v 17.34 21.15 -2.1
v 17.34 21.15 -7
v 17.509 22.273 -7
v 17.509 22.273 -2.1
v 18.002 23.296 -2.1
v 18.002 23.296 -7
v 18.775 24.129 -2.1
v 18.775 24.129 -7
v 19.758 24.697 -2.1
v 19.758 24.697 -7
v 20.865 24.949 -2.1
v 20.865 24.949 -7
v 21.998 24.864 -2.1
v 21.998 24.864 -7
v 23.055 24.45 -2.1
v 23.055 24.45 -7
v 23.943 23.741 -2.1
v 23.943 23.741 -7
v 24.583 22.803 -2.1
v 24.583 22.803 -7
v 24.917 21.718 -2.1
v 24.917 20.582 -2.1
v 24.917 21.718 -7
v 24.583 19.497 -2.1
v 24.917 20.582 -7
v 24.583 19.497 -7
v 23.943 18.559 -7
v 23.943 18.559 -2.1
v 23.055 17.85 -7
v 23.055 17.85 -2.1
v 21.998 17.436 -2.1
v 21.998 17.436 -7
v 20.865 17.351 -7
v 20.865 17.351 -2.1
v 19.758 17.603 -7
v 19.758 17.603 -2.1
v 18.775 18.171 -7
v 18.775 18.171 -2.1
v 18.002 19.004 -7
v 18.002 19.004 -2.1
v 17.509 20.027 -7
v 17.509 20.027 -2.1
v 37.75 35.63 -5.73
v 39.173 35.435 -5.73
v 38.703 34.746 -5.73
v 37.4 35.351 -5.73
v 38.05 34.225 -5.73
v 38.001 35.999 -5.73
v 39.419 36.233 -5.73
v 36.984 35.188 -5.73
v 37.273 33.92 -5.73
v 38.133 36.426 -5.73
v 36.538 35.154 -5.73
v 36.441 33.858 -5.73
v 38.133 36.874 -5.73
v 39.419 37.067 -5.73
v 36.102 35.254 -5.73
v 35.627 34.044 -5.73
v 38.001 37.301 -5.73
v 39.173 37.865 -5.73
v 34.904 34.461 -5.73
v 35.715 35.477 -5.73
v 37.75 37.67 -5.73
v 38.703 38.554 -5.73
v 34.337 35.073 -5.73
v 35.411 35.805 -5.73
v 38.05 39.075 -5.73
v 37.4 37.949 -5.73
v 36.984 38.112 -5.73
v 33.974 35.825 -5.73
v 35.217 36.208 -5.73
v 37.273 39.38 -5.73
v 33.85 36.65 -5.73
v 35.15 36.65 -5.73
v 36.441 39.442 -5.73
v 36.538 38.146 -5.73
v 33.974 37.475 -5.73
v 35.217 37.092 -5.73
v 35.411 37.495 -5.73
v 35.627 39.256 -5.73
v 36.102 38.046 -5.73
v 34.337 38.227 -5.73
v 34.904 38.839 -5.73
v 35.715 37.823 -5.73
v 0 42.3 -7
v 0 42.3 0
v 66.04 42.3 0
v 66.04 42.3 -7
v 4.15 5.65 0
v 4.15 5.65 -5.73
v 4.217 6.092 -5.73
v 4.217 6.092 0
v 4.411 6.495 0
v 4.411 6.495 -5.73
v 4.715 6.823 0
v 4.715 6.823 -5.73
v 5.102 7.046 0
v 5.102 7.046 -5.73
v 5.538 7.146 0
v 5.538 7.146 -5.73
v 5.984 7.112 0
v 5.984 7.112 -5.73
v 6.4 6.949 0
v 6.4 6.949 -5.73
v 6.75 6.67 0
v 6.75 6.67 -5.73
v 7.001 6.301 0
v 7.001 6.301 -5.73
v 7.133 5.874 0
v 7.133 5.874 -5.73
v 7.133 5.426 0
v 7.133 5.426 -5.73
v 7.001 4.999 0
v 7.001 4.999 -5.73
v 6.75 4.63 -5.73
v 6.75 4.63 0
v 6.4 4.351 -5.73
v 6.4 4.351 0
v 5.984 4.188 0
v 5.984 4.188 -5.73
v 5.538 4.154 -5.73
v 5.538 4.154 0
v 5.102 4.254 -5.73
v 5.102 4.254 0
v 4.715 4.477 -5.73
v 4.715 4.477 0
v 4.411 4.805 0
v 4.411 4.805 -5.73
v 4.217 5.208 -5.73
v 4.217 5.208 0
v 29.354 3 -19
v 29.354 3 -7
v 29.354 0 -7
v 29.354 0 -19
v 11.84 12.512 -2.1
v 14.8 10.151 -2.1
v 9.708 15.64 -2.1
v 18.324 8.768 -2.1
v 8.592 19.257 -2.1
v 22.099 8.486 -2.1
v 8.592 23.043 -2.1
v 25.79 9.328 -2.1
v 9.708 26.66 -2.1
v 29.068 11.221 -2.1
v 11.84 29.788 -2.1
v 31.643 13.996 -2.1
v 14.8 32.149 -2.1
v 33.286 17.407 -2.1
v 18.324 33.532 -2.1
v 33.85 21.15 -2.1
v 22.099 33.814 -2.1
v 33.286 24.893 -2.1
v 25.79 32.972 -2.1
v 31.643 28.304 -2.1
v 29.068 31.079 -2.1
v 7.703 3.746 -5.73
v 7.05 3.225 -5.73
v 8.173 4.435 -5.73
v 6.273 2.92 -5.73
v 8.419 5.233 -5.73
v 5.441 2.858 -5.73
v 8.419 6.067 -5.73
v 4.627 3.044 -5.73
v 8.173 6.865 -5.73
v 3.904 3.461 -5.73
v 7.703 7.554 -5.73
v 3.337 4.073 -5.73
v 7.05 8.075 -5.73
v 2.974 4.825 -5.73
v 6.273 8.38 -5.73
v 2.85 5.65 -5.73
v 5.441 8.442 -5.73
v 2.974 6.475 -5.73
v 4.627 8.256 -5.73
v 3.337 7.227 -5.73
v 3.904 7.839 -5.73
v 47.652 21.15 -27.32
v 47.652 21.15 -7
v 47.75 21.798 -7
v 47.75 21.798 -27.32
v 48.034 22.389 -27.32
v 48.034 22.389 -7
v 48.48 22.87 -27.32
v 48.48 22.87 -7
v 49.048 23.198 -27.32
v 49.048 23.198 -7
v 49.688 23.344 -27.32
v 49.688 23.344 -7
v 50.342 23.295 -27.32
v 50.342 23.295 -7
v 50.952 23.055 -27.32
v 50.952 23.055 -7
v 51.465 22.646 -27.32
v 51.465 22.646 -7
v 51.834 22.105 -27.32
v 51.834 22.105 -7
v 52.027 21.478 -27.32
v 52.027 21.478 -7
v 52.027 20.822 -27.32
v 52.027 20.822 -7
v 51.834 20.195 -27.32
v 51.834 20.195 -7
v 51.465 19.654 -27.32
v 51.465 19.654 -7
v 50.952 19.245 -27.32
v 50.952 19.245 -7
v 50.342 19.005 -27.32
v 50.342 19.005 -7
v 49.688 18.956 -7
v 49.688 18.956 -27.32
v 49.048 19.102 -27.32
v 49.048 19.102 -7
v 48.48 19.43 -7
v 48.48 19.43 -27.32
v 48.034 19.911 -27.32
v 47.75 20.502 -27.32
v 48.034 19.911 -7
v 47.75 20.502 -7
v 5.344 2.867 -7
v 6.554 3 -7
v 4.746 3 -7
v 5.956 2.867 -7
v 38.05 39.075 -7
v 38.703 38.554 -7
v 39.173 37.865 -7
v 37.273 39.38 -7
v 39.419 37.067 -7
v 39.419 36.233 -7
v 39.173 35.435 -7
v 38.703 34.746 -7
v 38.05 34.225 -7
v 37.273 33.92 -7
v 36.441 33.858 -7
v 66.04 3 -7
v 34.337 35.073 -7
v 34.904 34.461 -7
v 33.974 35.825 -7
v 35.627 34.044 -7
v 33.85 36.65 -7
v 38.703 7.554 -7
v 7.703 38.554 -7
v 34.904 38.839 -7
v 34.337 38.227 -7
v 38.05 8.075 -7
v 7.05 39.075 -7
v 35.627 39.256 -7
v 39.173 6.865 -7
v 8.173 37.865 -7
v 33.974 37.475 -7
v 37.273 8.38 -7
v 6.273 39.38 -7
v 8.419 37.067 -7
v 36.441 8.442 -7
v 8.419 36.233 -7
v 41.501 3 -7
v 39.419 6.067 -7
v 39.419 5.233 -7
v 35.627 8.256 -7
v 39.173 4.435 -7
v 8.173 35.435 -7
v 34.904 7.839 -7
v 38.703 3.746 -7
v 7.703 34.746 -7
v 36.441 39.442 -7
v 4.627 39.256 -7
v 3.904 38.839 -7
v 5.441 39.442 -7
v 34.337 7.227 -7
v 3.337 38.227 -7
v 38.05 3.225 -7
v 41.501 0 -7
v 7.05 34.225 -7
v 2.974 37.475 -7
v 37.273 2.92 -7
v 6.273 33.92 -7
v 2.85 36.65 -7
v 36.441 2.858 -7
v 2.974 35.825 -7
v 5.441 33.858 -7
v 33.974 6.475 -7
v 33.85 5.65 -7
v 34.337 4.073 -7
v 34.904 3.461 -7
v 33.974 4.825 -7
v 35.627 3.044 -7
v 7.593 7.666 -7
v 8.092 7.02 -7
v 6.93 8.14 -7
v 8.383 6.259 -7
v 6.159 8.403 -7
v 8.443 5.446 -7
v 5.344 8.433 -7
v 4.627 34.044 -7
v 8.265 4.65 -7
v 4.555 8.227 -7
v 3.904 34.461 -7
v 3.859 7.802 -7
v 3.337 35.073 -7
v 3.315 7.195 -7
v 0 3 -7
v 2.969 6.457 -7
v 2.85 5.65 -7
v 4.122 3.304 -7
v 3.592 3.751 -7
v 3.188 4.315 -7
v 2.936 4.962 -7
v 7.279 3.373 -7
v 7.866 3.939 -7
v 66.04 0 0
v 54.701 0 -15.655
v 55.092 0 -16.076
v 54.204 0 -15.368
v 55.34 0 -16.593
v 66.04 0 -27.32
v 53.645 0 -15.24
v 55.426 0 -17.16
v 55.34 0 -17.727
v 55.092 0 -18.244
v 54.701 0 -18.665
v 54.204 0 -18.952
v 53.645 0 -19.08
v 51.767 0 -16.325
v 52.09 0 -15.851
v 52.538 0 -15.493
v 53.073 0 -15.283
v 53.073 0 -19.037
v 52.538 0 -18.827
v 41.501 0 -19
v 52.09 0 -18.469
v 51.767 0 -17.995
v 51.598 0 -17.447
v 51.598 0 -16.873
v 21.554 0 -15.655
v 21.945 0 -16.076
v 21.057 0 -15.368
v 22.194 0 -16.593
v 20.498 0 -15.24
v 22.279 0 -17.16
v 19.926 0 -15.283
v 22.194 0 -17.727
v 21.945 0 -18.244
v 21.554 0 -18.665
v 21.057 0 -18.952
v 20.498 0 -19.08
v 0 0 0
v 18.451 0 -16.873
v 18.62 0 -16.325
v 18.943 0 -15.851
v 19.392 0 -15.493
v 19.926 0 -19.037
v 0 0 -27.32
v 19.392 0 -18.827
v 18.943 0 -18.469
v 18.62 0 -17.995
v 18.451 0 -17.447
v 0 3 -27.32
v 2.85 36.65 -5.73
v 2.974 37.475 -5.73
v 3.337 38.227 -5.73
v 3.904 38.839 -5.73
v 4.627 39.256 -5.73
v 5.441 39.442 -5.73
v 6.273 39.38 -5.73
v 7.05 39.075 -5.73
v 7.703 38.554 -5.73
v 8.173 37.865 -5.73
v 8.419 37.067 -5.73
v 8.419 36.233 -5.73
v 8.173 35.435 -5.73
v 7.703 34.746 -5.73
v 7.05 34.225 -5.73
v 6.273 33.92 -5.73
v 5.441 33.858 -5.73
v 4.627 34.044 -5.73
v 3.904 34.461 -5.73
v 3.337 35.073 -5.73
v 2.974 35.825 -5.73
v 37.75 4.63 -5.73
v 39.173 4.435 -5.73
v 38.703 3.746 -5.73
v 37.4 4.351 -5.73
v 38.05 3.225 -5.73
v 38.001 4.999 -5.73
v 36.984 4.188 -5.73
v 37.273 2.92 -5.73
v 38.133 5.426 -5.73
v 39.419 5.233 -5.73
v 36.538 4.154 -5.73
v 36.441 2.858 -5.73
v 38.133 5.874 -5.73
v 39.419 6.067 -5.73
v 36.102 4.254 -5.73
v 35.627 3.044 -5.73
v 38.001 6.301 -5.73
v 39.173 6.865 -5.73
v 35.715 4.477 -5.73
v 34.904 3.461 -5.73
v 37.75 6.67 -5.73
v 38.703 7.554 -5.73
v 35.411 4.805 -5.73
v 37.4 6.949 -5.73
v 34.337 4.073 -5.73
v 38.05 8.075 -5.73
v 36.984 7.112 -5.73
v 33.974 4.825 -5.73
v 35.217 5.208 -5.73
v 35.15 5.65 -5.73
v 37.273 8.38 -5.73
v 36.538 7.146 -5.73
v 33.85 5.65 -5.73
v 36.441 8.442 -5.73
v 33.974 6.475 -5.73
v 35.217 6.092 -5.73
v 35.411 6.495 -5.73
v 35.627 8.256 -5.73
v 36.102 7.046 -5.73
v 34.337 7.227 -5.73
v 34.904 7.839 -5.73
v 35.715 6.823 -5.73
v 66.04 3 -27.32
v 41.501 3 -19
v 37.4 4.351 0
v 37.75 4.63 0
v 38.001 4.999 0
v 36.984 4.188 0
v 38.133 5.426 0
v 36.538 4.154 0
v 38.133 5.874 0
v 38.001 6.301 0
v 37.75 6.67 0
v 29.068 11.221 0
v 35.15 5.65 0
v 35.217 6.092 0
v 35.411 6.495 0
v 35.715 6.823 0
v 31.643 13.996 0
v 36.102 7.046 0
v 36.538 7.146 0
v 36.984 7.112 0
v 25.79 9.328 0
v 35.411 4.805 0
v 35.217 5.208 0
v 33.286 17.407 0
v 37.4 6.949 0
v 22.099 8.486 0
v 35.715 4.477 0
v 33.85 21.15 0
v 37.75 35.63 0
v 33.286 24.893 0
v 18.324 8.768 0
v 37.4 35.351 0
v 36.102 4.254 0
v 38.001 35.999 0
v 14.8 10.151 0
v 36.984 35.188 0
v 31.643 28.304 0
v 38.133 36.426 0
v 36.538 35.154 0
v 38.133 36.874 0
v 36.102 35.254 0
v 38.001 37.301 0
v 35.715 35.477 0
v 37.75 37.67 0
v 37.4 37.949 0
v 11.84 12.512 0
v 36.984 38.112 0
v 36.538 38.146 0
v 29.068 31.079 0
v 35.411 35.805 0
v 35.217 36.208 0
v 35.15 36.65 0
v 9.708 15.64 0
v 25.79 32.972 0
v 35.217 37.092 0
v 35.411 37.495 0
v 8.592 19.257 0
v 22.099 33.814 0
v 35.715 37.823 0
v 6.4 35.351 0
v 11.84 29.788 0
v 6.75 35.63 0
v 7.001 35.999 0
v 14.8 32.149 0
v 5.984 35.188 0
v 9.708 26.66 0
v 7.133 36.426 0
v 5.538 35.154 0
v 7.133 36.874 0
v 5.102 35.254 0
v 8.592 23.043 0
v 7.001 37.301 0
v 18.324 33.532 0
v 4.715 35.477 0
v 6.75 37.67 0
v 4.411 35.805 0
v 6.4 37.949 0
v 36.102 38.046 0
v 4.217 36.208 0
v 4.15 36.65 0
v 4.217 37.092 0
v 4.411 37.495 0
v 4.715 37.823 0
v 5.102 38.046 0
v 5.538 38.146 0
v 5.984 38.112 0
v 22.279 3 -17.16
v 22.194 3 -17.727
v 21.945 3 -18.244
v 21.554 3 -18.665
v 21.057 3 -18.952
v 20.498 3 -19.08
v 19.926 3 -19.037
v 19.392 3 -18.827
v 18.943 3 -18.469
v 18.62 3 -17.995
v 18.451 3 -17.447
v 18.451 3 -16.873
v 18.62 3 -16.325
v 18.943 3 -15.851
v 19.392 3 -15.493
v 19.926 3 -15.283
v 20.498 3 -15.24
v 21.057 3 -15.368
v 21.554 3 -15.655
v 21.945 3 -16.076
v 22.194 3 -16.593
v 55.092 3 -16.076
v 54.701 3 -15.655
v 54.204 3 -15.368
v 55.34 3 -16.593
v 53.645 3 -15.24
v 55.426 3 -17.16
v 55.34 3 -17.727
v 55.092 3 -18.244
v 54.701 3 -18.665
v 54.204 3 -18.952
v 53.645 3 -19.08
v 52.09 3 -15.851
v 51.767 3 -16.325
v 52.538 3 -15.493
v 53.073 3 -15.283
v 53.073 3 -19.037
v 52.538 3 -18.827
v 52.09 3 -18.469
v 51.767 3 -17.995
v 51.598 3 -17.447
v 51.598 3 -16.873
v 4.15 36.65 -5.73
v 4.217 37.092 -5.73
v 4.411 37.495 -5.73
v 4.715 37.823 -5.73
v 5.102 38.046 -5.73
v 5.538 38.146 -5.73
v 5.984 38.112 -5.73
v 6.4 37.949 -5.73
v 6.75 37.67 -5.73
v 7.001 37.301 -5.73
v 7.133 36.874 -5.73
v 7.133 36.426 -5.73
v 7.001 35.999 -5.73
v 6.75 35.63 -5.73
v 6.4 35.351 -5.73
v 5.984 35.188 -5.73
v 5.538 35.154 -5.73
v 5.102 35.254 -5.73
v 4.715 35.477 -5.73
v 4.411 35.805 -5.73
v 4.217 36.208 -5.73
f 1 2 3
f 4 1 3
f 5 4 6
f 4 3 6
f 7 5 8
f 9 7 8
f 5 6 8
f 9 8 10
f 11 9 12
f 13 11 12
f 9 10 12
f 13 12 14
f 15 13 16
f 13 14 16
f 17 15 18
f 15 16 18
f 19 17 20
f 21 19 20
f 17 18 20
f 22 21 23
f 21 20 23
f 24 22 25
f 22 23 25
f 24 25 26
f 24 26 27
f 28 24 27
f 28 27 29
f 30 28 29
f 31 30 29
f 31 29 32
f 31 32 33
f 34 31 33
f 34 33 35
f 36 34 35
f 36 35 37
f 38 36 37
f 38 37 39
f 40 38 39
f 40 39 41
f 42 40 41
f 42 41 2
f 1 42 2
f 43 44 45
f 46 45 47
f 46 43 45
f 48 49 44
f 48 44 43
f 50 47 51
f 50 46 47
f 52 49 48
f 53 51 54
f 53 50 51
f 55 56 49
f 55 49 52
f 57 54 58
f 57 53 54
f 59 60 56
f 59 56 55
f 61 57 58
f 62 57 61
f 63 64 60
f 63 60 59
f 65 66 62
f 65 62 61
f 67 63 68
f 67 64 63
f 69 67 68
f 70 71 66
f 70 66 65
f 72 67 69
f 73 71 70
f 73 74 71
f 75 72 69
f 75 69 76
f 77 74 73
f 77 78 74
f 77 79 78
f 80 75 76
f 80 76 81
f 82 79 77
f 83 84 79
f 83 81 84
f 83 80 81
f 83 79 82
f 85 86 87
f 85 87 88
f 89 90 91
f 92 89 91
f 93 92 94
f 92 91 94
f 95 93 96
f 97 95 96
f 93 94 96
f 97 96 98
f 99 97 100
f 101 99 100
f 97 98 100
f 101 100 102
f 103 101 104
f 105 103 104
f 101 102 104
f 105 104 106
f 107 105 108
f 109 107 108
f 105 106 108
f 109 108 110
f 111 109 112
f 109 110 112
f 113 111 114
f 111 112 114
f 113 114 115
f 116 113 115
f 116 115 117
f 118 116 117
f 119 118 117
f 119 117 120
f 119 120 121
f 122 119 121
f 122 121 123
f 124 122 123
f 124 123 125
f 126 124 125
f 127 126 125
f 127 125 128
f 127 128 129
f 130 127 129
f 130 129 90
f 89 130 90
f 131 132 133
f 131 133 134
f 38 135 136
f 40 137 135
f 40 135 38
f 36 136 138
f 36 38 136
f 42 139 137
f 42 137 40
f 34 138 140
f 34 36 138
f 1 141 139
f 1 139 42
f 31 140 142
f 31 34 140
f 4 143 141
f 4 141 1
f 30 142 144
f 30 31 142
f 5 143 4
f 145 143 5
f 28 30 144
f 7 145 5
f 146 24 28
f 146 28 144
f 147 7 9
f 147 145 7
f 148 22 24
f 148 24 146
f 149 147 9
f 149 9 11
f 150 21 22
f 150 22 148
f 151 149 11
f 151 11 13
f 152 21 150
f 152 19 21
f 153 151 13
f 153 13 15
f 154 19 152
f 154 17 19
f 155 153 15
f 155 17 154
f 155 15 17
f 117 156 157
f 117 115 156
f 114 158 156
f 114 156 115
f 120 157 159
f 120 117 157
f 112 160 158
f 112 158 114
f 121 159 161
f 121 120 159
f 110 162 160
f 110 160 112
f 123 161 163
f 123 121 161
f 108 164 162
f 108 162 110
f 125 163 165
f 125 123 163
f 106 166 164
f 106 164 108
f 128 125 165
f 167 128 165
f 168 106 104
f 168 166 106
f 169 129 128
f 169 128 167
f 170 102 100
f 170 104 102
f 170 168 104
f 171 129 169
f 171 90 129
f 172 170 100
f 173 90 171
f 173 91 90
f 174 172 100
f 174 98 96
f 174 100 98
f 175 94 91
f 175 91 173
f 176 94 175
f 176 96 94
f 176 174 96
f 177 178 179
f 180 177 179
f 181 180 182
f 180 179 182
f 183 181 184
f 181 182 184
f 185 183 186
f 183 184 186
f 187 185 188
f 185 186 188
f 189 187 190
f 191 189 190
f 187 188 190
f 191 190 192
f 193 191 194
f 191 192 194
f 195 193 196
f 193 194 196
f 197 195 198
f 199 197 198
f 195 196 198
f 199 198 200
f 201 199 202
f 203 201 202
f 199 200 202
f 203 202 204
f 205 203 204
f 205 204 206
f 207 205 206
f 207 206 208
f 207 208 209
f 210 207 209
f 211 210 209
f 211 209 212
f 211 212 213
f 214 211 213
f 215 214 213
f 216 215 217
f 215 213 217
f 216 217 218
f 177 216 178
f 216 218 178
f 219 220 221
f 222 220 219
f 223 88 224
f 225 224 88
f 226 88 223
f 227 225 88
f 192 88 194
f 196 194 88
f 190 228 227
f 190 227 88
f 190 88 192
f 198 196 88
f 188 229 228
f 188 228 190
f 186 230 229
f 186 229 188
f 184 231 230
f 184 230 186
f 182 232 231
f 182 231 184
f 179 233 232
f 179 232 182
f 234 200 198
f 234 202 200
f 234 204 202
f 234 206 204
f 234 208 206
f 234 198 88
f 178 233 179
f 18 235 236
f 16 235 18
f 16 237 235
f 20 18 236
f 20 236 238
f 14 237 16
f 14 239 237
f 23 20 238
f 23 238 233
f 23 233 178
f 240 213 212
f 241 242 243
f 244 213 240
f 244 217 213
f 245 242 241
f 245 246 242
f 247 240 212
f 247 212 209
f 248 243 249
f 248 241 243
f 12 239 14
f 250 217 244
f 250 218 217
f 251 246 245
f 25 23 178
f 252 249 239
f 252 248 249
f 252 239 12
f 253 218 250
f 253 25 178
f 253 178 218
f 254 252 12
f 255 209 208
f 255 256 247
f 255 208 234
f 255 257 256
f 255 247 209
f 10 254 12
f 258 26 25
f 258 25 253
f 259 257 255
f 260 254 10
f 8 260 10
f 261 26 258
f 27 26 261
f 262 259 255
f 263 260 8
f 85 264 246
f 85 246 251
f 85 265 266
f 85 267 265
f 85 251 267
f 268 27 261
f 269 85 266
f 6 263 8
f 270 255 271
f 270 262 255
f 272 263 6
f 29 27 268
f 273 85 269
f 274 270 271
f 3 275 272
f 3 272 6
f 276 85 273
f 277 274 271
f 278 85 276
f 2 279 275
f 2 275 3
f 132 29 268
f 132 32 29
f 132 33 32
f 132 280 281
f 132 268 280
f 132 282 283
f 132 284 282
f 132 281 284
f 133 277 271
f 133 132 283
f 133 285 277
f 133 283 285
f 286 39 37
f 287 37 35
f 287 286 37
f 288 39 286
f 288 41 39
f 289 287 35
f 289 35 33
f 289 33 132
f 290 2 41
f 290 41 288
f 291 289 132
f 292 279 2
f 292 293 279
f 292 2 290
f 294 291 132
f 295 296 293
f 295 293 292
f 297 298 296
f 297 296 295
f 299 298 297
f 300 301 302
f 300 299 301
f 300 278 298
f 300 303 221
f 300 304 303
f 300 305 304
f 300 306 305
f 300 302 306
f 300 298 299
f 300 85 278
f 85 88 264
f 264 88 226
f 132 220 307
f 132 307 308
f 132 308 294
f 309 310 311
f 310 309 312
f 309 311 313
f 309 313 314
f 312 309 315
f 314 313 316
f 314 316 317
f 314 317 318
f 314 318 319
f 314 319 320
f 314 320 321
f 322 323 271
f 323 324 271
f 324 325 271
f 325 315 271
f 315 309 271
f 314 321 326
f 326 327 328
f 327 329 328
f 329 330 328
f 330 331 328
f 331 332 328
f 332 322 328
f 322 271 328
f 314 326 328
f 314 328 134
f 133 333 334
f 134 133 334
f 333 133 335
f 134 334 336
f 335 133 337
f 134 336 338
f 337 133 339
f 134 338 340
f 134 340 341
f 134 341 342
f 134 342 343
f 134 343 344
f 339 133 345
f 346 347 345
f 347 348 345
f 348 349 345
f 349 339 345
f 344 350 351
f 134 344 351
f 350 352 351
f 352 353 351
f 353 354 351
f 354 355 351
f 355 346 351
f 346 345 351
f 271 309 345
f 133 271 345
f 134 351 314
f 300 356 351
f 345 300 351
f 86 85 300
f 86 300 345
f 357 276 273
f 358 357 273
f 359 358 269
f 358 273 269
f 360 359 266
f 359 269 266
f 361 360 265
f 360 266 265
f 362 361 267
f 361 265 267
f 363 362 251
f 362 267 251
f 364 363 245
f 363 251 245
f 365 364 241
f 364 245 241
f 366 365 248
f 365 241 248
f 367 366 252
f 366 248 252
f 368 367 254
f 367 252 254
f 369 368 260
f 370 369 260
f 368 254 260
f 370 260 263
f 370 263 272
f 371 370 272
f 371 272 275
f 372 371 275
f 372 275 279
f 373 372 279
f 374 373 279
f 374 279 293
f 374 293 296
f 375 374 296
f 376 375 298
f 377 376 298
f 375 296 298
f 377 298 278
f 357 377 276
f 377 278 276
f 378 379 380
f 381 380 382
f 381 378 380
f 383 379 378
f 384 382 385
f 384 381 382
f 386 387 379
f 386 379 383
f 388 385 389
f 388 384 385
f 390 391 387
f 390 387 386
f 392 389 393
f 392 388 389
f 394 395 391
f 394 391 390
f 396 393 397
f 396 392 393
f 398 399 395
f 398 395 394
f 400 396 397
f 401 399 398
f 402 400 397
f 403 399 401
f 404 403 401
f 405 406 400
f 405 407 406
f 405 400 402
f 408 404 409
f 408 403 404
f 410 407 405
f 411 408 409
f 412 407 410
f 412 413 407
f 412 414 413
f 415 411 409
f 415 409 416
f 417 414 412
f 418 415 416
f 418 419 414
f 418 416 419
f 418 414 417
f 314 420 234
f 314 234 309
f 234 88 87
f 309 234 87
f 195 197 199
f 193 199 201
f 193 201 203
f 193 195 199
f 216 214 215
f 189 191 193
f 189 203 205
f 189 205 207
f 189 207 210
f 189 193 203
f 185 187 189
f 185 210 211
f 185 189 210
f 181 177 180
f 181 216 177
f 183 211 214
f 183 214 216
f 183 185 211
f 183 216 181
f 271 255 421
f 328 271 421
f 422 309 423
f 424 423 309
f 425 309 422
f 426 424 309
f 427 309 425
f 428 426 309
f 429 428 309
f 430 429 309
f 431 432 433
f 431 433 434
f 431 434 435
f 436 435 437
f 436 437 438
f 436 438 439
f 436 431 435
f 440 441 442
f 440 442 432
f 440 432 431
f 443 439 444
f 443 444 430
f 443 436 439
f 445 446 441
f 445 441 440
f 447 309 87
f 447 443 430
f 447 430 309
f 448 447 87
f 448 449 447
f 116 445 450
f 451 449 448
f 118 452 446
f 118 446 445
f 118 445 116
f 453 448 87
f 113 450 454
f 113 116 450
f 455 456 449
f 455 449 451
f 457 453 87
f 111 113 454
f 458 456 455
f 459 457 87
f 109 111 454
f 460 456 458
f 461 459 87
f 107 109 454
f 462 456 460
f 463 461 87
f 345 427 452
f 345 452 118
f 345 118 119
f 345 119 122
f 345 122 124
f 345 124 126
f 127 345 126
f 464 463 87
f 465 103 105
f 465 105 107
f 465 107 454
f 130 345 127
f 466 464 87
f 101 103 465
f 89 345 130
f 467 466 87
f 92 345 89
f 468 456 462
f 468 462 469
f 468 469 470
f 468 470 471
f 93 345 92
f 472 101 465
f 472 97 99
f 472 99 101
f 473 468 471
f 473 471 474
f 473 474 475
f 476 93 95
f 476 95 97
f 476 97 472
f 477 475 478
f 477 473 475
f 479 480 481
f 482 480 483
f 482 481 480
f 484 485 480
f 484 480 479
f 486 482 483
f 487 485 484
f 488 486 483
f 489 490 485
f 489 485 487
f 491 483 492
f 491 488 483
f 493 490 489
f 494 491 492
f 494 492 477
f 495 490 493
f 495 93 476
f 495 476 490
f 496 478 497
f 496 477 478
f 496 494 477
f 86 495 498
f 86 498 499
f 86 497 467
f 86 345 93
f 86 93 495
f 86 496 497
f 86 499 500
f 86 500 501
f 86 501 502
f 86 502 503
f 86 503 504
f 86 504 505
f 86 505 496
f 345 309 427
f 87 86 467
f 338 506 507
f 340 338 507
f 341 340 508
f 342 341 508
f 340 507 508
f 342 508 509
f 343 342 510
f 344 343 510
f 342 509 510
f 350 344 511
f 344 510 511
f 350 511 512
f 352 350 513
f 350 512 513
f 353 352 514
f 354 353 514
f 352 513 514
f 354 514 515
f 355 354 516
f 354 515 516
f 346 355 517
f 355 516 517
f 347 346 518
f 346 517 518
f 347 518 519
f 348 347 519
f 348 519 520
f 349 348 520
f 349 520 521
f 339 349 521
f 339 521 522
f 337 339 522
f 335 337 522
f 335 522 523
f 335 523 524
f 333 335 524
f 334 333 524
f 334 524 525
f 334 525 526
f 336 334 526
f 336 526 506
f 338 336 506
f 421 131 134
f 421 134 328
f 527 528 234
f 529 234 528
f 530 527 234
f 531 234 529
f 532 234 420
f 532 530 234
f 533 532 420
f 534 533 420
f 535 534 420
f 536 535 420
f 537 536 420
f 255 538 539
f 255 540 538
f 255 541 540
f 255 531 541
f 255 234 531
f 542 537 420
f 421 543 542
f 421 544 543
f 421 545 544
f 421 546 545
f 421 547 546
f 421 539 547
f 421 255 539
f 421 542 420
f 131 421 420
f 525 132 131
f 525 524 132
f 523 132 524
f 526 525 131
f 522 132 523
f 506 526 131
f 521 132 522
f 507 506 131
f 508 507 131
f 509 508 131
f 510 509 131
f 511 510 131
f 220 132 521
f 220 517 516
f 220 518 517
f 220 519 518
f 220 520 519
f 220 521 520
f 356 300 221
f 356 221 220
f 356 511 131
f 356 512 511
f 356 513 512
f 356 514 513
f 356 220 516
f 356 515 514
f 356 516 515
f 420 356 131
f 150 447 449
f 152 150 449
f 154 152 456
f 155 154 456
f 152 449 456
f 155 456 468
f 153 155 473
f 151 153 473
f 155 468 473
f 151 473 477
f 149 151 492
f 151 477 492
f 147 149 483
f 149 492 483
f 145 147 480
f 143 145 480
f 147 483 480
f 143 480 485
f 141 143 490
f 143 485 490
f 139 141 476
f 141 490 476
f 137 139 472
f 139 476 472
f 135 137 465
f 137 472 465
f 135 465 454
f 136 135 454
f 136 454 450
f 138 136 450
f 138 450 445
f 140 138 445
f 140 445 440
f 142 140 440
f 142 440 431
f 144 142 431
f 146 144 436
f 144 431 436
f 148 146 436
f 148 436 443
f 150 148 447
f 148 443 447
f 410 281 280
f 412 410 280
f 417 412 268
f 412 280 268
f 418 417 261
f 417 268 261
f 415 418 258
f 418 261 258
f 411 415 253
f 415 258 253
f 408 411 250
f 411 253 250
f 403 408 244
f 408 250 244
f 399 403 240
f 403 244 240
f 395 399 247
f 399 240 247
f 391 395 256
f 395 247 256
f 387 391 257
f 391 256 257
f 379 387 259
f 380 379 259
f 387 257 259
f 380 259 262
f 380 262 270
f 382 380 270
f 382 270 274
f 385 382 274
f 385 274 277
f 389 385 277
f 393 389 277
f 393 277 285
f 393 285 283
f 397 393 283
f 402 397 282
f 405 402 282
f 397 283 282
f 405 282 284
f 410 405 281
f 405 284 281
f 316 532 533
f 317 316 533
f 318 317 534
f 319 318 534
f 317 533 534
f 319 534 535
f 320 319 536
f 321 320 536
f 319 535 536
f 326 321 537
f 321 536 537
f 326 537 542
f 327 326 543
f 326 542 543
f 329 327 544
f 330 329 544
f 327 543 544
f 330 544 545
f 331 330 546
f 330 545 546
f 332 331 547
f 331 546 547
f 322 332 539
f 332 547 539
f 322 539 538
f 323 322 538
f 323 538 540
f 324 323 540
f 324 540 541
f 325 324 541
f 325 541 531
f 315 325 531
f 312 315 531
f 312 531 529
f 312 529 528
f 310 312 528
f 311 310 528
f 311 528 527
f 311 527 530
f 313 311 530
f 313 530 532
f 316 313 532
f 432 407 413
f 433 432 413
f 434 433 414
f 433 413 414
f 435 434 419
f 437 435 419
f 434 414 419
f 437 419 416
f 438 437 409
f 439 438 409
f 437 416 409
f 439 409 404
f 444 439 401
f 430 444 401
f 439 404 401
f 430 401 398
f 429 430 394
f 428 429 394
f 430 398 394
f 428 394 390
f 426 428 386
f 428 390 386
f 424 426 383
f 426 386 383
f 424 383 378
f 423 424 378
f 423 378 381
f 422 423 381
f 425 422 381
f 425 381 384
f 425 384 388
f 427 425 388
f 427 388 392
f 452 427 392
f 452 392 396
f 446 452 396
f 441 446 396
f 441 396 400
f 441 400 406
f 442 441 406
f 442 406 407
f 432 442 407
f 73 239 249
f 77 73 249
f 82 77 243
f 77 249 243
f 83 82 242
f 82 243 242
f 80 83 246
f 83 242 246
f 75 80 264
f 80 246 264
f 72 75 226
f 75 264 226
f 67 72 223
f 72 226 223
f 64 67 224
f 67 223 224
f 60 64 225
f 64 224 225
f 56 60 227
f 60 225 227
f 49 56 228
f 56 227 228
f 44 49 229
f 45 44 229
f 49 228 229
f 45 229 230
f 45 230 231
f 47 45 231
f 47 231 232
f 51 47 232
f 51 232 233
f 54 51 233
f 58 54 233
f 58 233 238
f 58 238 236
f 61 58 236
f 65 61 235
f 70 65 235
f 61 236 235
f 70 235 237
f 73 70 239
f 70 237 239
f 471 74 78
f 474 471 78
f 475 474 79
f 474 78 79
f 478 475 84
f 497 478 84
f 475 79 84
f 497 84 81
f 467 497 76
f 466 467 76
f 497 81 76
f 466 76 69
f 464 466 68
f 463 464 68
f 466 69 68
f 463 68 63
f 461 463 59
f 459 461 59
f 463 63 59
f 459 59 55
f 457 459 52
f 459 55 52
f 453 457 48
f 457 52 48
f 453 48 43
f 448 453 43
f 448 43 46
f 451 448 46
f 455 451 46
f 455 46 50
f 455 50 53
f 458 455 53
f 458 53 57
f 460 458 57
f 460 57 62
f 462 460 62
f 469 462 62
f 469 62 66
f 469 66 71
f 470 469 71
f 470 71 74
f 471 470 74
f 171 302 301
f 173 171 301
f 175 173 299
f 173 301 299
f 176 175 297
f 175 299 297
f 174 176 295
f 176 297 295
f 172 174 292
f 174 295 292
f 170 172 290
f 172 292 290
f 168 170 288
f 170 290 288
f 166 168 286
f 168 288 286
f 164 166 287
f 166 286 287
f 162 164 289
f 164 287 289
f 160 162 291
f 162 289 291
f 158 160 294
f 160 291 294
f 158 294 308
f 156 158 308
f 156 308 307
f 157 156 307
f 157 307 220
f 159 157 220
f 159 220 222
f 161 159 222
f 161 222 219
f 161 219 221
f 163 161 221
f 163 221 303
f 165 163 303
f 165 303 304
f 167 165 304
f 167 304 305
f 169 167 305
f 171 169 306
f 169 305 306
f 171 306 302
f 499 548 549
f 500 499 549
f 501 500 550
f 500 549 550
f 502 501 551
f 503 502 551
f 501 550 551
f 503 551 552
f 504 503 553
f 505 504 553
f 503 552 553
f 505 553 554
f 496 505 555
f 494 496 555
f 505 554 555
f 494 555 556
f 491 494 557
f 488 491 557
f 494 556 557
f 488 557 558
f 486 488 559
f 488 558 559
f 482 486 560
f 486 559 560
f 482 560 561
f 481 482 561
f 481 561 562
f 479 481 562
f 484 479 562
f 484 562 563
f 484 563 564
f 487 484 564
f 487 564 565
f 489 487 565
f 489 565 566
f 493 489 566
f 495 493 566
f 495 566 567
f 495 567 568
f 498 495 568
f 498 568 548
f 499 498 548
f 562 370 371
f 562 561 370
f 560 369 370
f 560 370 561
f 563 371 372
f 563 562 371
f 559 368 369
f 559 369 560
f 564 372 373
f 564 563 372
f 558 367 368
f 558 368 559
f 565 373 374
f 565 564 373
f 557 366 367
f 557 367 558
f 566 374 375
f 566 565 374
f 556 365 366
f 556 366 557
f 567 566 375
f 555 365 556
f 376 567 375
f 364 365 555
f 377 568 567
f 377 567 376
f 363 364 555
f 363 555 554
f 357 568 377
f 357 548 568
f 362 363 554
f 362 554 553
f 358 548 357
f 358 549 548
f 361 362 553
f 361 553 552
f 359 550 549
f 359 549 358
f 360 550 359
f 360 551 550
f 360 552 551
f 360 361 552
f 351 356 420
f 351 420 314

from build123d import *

# Parameters (mm, degrees)
BOSS_EXTRUDE1_DEPTH    = 66.04
SKETCH3_R              = 12.7
CUT_EXTRUDE1_DEPTH     = 2.1
SKETCH2_R              = 1.5
SKETCH2_R_2            = 3.81
CUT_EXTRUDE2_DEPTH     = 8
SKETCH4_R              = 2.2
BOSS_EXTRUDE2_DEPTH    = 20.32
SKETCH6_W              = 12.1468
SKETCH6_H              = 12
CUT_EXTRUDE3_DEPTH     = 4
SKETCH7_R              = 2.8
CUT_EXTRUDE4_DEPTH     = 1.27
SKETCH8_R              = 1.925
M4_BOTTOM_SCREWS_DEPTH = 4


with BuildPart() as part:
    # Sketch1 → Boss-Extrude1 (new body)
    with BuildSketch(Plane(origin=(0, 0, 0), x_dir=(0, 0, -1), z_dir=(1, 0, 0))):
        Polygon((7, 3), (27.32, 3), (27.32, 0), (2.660377358, 0), (0, 0), (0, 42.3), (7, 42.3), align=None)
    extrude(amount=BOSS_EXTRUDE1_DEPTH)

    # Sketch3 → Cut-Extrude1 (cut)
    with BuildSketch(Plane.XY):
        with Locations((21.15, 21.15)):
            Circle(SKETCH3_R)
    extrude(amount=-CUT_EXTRUDE1_DEPTH, mode=Mode.SUBTRACT)

    # Sketch2 → Cut-Extrude2 (cut, through all)
    with BuildSketch(Plane(origin=(0, 0, -7), x_dir=(-1, 0, 0), z_dir=(0, 0, -1))):
        with Locations((-5.65, 36.65)):
            Circle(SKETCH2_R)
        with Locations((-5.65, 5.65)):
            Circle(SKETCH2_R)
        with Locations((-36.65, 36.65)):
            Circle(SKETCH2_R)
        with Locations((-36.65, 5.65)):
            Circle(SKETCH2_R)
        with Locations((-21.15, 21.15)):
            Circle(SKETCH2_R_2)
    extrude(amount=-CUT_EXTRUDE2_DEPTH, mode=Mode.SUBTRACT)

    # Sketch4 → Boss-Extrude2 (add)
    with BuildSketch(Plane(origin=(0, 0, -7), x_dir=(-1, 0, 0), z_dir=(0, 0, -1))):
        with Locations((-49.852, 21.15)):
            Circle(SKETCH4_R)
    extrude(amount=BOSS_EXTRUDE2_DEPTH)

    # Sketch6 → Cut-Extrude3 (cut, through all)
    with BuildSketch(Plane(origin=(0, 3, 0), x_dir=(1, 0, 0), z_dir=(0, 1, 0))):
        with Locations((35.4276, 13)):
            Rectangle(SKETCH6_W, SKETCH6_H)
    extrude(amount=-CUT_EXTRUDE3_DEPTH, mode=Mode.SUBTRACT)

    # Sketch7 → Cut-Extrude4 (cut)
    with BuildSketch(Plane(origin=(0, 0, -7), x_dir=(-1, 0, 0), z_dir=(0, 0, -1))):
        with Locations((-36.65, 36.65)):
            Circle(SKETCH7_R)
        with Locations((-36.65, 5.65)):
            Circle(SKETCH7_R)
        with Locations((-5.65, 5.65)):
            Circle(SKETCH7_R)
        with Locations((-5.65, 36.65)):
            Circle(SKETCH7_R)
    extrude(amount=-CUT_EXTRUDE4_DEPTH, mode=Mode.SUBTRACT)

    # Sketch8 → M4 bottom screws (cut, through all)
    with BuildSketch(Plane(origin=(0, 3, 0), x_dir=(1, 0, 0), z_dir=(0, 1, 0))):
        with Locations((20.3542, 17.16)):
            Circle(SKETCH8_R)
        with Locations((53.501, 17.16)):
            Circle(SKETCH8_R)
    extrude(amount=-M4_BOTTOM_SCREWS_DEPTH, mode=Mode.SUBTRACT)


solid = part.part
